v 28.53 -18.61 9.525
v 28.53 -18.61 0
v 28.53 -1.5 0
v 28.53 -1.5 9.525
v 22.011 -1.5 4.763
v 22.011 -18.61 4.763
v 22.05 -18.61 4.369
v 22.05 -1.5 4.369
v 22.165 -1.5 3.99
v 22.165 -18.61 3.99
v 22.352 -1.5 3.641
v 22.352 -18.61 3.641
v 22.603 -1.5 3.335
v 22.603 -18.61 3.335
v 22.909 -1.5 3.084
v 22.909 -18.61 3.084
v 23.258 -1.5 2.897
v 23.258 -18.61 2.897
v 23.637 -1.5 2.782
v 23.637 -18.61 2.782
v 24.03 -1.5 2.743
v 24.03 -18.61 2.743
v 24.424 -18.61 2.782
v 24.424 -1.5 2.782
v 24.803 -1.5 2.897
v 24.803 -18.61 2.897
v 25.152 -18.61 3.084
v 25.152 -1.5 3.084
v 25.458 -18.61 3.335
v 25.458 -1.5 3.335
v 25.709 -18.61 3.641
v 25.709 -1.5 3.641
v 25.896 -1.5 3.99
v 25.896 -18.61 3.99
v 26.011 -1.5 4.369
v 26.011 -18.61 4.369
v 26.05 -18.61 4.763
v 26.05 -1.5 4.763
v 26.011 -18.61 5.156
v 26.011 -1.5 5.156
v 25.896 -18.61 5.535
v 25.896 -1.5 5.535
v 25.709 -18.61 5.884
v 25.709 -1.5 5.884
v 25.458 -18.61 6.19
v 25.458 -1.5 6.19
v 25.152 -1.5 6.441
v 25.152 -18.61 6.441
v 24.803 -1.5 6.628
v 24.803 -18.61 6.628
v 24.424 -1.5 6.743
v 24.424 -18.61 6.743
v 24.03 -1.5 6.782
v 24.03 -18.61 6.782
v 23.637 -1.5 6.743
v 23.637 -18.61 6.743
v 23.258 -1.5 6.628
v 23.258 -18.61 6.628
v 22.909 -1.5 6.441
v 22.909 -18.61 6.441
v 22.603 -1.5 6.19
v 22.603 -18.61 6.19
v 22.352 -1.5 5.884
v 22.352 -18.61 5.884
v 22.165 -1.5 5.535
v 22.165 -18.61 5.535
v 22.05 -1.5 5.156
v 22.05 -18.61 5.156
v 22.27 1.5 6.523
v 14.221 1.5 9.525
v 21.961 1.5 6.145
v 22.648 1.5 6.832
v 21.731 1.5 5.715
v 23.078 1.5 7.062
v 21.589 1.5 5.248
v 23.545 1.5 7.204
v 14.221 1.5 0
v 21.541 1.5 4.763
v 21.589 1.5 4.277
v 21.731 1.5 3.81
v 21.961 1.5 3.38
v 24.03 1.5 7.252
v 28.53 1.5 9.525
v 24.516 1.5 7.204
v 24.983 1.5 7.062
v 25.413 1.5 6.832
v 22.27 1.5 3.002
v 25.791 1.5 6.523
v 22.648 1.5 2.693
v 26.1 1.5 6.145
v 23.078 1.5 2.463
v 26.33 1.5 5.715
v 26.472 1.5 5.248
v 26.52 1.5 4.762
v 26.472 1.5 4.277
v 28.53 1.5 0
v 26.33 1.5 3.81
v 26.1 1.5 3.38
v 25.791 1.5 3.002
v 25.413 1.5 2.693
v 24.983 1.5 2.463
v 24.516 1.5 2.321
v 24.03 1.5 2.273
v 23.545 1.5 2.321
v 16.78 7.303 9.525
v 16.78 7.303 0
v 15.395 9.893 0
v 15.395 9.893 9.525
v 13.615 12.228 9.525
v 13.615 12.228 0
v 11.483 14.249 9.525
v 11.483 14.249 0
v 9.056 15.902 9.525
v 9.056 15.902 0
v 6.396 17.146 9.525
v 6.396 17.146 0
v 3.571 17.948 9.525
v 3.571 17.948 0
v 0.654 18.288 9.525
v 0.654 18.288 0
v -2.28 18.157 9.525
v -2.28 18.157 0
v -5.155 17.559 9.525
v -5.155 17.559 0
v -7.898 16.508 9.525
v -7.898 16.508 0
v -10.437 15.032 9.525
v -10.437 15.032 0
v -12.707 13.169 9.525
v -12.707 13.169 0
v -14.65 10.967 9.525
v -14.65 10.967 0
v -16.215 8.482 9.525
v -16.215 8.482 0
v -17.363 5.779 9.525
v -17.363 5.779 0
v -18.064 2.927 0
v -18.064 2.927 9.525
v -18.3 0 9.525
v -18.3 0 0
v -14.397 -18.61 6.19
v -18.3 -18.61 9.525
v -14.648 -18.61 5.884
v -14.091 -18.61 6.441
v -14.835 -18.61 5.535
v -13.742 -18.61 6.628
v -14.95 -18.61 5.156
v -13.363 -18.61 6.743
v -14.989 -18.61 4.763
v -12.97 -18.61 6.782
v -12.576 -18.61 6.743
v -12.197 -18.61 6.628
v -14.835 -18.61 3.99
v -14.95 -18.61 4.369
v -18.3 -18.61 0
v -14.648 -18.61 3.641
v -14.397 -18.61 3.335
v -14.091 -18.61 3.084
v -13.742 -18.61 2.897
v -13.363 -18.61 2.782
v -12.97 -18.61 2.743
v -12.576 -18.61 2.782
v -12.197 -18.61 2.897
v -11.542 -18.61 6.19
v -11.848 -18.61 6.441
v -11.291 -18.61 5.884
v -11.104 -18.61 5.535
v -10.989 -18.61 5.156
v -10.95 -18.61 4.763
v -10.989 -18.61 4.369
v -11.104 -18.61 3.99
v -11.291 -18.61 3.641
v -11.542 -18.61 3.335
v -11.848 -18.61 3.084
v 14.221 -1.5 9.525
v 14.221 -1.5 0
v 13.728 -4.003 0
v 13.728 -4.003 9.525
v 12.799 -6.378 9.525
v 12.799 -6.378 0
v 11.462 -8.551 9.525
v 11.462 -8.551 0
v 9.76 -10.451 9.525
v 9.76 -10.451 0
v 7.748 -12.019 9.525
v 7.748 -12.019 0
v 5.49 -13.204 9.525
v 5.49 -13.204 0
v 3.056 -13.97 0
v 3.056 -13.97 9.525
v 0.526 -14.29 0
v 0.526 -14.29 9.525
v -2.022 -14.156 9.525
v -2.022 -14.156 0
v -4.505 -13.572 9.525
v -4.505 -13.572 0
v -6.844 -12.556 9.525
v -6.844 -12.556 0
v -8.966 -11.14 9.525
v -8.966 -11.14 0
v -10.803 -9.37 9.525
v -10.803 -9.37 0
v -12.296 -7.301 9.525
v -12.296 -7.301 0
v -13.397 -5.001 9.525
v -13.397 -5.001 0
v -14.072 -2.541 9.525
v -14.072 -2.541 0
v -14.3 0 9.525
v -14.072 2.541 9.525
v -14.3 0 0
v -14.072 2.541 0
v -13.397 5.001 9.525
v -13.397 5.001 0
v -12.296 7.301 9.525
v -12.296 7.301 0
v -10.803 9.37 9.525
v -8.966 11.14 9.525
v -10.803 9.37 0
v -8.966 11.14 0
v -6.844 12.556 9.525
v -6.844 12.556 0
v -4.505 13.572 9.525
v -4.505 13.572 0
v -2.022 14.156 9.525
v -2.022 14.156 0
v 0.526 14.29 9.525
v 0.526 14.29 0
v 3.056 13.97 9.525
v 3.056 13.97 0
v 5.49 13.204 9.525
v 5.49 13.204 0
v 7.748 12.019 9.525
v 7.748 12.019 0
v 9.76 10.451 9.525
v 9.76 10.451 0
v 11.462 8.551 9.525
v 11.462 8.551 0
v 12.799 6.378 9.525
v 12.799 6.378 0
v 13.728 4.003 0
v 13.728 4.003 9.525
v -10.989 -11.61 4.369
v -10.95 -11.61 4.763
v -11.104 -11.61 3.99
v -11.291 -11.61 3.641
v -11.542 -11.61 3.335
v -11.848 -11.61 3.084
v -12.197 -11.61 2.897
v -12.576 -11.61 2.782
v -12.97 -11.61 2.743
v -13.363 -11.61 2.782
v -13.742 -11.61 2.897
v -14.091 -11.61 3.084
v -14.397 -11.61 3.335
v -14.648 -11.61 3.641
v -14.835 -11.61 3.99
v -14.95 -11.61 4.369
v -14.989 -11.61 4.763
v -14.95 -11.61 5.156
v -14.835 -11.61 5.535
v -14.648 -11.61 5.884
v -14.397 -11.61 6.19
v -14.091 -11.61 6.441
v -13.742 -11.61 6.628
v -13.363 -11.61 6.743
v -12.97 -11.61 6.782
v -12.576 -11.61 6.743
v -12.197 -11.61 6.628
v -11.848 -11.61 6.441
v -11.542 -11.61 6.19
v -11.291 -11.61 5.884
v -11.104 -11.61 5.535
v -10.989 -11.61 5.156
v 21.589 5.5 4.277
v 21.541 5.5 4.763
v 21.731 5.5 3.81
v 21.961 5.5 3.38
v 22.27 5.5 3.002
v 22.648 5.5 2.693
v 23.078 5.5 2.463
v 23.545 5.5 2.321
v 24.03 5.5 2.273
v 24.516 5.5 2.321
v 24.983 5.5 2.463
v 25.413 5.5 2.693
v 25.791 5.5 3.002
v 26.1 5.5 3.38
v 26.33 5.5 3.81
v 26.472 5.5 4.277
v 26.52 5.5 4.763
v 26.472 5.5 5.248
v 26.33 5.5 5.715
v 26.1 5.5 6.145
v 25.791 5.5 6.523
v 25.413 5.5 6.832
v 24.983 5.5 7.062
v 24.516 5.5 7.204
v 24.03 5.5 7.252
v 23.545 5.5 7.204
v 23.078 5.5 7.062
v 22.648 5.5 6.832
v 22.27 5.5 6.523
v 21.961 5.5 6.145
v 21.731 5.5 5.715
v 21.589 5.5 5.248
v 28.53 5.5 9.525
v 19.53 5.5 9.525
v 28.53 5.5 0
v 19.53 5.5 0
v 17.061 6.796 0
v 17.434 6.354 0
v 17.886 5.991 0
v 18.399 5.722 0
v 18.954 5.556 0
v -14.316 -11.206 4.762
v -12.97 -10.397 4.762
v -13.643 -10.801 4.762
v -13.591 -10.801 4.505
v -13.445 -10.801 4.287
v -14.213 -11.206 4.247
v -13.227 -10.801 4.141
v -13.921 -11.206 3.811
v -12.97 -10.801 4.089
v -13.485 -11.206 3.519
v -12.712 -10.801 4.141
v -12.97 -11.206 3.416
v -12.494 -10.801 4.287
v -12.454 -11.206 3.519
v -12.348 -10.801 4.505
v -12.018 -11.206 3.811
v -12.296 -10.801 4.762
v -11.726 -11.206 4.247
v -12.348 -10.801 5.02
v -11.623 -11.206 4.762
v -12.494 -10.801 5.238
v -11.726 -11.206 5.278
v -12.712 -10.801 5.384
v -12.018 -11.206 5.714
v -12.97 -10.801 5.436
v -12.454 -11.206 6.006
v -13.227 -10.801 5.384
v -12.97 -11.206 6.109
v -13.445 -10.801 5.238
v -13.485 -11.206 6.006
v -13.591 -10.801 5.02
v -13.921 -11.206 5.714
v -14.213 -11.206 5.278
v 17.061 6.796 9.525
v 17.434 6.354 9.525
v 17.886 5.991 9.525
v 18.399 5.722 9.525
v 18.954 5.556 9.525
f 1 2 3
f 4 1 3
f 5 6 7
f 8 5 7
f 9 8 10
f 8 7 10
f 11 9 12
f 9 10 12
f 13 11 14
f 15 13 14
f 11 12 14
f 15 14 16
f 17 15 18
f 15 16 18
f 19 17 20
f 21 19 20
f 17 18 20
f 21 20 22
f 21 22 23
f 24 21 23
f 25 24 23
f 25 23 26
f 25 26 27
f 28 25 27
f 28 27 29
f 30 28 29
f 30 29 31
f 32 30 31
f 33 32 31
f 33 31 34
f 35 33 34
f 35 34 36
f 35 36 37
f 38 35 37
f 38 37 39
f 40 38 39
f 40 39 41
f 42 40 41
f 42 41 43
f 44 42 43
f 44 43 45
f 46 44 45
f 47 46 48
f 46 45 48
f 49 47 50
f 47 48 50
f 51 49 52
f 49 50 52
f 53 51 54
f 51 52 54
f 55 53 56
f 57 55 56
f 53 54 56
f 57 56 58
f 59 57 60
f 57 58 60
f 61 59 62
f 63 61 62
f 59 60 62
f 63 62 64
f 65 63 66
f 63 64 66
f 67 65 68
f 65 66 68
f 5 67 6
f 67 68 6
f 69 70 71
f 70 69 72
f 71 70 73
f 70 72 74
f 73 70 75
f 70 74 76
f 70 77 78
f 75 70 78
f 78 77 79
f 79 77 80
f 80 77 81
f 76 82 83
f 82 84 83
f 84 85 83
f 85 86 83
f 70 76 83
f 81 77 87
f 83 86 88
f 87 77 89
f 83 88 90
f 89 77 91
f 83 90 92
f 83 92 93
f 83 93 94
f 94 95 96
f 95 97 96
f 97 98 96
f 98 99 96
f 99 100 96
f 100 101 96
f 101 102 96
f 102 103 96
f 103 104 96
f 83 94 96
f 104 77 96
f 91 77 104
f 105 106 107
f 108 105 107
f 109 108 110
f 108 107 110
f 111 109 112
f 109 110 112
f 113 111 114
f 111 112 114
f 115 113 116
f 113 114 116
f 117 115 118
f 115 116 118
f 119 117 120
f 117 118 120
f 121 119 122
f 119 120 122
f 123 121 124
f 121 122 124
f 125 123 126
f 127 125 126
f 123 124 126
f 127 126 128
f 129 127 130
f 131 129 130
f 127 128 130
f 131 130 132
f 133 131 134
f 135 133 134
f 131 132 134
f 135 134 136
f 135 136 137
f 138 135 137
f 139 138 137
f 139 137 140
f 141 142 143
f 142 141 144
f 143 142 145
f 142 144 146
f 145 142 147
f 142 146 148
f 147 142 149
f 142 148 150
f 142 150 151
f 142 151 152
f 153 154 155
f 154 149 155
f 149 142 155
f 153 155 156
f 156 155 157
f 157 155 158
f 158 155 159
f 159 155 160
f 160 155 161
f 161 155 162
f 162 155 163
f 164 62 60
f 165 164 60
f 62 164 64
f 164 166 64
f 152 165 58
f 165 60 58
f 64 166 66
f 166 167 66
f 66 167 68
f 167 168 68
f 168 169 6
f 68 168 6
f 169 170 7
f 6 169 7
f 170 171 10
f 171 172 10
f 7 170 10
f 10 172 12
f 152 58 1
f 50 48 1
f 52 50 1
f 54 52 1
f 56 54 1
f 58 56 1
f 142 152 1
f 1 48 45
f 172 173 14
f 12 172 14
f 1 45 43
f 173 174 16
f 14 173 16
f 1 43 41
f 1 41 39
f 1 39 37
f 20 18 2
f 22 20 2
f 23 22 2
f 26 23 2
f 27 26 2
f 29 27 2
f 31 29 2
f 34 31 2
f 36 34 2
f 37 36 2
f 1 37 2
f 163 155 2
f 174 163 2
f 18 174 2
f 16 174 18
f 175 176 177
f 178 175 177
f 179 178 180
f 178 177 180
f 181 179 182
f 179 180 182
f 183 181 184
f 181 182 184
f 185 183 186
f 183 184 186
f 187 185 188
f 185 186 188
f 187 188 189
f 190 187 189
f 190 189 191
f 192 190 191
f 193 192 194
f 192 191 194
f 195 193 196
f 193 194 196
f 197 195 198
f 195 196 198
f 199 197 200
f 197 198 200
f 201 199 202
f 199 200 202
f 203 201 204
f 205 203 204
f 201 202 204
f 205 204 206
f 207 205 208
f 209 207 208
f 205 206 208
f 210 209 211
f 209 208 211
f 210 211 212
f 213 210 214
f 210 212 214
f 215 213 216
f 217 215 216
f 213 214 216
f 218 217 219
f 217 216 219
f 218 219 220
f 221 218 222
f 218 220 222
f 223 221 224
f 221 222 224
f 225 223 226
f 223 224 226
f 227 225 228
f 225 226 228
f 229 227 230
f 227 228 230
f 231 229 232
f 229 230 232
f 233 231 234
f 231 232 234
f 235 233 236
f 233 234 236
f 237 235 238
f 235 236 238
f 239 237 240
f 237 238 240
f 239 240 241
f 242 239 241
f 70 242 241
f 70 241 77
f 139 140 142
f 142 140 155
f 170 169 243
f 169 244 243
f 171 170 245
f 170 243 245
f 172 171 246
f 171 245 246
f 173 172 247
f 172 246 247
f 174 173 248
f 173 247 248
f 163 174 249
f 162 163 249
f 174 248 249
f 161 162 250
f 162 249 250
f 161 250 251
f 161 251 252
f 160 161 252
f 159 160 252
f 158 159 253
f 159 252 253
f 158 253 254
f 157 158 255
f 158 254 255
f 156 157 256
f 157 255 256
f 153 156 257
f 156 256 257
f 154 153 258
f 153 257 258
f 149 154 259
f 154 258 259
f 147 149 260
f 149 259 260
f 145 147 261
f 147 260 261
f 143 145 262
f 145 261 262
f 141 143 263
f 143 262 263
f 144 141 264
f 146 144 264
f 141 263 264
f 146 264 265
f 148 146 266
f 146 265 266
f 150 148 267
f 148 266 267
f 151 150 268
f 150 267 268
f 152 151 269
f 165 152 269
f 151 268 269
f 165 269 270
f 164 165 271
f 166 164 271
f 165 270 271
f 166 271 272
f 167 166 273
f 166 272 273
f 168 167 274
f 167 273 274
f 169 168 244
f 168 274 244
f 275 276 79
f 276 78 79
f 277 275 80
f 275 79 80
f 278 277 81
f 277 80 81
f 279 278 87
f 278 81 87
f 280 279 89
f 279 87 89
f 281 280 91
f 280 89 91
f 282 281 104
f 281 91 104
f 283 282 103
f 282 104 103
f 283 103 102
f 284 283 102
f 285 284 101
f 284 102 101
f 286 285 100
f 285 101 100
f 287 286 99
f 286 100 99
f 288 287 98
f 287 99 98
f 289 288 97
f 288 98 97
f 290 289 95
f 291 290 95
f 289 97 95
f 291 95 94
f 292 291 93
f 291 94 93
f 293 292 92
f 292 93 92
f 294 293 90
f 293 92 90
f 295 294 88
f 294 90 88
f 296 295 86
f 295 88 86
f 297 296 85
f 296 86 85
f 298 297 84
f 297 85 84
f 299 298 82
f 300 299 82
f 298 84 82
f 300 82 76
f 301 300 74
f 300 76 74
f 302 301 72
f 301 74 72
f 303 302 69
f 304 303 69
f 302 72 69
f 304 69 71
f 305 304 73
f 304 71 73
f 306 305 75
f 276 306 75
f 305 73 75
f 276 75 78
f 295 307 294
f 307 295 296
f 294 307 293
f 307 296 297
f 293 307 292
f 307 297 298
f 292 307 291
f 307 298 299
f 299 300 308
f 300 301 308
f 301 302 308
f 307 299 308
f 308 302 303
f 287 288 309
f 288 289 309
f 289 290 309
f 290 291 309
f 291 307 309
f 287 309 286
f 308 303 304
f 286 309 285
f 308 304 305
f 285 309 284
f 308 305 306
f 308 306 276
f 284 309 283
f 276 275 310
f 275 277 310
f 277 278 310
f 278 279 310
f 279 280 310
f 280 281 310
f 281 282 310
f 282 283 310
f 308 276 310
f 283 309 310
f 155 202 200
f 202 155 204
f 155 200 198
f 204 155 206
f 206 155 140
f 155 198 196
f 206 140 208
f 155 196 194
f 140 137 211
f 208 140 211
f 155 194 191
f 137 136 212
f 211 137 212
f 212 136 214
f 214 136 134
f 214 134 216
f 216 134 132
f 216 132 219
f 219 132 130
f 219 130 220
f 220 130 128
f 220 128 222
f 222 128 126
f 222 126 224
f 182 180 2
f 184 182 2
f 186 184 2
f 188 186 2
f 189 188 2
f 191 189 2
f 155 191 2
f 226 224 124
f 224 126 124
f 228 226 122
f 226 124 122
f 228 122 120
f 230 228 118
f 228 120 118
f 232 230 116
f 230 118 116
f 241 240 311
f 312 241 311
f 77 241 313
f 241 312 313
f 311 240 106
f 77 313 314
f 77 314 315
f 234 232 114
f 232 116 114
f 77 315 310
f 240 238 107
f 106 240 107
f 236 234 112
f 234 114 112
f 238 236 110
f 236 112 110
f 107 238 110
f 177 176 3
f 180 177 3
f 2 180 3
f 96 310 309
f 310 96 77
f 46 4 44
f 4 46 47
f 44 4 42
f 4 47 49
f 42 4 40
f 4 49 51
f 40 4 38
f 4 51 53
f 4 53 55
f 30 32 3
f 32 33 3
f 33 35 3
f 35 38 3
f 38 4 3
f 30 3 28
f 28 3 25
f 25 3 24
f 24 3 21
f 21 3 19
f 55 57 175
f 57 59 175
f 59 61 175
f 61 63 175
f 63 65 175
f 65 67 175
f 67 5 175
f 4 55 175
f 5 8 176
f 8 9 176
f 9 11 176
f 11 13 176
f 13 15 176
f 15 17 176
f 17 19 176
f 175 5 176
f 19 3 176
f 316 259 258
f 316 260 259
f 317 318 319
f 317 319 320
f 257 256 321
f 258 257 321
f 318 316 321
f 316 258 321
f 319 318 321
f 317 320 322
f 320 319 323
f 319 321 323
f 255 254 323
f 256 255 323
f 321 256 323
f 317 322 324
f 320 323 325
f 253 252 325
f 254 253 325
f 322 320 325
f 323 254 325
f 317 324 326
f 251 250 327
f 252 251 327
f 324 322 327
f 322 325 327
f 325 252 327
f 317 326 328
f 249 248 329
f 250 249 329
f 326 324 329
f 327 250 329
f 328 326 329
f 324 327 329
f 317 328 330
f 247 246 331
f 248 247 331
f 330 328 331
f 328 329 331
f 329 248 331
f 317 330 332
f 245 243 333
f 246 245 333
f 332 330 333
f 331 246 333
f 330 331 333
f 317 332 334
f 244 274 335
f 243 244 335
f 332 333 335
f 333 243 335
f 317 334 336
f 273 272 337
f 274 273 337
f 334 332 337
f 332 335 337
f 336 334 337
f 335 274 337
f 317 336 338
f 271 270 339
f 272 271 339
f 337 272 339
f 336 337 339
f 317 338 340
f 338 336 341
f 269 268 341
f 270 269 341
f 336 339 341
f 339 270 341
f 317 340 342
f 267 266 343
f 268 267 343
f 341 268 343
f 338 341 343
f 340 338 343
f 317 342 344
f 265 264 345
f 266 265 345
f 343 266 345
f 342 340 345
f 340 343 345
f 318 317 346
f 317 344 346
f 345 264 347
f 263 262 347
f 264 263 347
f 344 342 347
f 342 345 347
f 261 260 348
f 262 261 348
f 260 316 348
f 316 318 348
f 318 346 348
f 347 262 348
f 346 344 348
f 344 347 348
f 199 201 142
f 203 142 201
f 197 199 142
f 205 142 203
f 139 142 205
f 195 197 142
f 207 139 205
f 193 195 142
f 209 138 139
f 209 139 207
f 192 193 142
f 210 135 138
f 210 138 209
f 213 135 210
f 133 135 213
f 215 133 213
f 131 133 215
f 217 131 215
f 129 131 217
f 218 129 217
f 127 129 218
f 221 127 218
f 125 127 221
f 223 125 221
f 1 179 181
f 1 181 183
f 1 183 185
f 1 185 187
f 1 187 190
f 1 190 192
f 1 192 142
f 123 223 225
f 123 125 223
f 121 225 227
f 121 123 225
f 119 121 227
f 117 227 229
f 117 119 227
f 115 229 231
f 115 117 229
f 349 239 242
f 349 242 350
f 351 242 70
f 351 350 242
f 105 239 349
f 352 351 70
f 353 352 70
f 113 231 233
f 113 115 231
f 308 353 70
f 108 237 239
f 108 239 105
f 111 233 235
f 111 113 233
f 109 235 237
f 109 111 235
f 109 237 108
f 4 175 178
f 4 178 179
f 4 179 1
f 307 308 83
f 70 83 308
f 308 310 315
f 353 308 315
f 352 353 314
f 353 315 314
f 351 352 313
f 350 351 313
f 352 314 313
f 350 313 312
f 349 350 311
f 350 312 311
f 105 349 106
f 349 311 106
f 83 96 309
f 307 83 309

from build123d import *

# Parameters (mm, degrees)
BOSS_EXTRUDE1_DEPTH        = 9.525
F_10_CLEARANCE_HOLE1_D     = 4.9784
F_10_CLEARANCE_HOLE1_DEPTH = 4
F_10_CLEARANCE_HOLE1_TIP   = 1.495662253
F_10_32_TAPPED_HOLE1_D     = 4.0386
F_10_32_TAPPED_HOLE2_D     = 4.0386
F_10_32_TAPPED_HOLE2_DEPTH = 7
F_10_32_TAPPED_HOLE2_TIP   = 1.213317848


with BuildPart() as part:
    # Sketch1 → Boss-Extrude1 (new body)
    with BuildSketch(Plane.XY):
        with BuildLine():
            ThreePointArc((14.221111068, -1.5), (-14.3, 0), (14.221111068, 1.5))
            Line((14.221111068, 1.5), (28.530488985, 1.5))
            Line((28.530488985, 1.5), (28.530488985, 5.5))
            Line((28.530488985, 5.5), (19.530488985, 5.5))
            ThreePointArc((19.530488985, 5.5), (17.886036082, 5.990861772), (16.779715889, 7.302816901))
            ThreePointArc((16.779715889, 7.302816901), (-3.729691625, 17.915897979), (-18.3, 0))
            Line((-18.3, 0), (-18.3, -18.61))
            Line((-18.3, -18.61), (28.530488985, -18.61))
            Line((28.530488985, -18.61), (28.530488985, -1.5))
            Line((28.530488985, -1.5), (14.221111068, -1.5))
        make_face()
    extrude(amount=BOSS_EXTRUDE1_DEPTH)

    # #10 Clearance Hole1
    with Locations(Plane(origin=(0, 5.5, 0), x_dir=(1, 0, 0), z_dir=(0, 1, 0))):
        with Locations((24.030488985, -4.7625)):
            Hole(F_10_CLEARANCE_HOLE1_D / 2, depth=F_10_CLEARANCE_HOLE1_DEPTH)
            with Locations((0, 0, -(F_10_CLEARANCE_HOLE1_DEPTH + F_10_CLEARANCE_HOLE1_TIP / 2))):  # 118° drill point
                Cone(0, F_10_CLEARANCE_HOLE1_D / 2, F_10_CLEARANCE_HOLE1_TIP, mode=Mode.SUBTRACT)

    # #10-32 Tapped Hole1 (through all)
    with Locations(Plane(origin=(0, -1.5, 0), x_dir=(1, 0, 0), z_dir=(0, 1, 0))):
        with Locations((24.030488985, -4.7625)):
            Hole(F_10_32_TAPPED_HOLE1_D / 2)

    # #10-32 Tapped Hole2
    with Locations(Plane(origin=(0, -18.61, 0), x_dir=(-1, 0, 0), z_dir=(0, -1, 0))):
        with Locations((12.969511015, -4.7625)):
            Hole(F_10_32_TAPPED_HOLE2_D / 2, depth=F_10_32_TAPPED_HOLE2_DEPTH)
            with Locations((0, 0, -(F_10_32_TAPPED_HOLE2_DEPTH + F_10_32_TAPPED_HOLE2_TIP / 2))):  # 118° drill point
                Cone(0, F_10_32_TAPPED_HOLE2_D / 2, F_10_32_TAPPED_HOLE2_TIP, mode=Mode.SUBTRACT)


solid = part.part
